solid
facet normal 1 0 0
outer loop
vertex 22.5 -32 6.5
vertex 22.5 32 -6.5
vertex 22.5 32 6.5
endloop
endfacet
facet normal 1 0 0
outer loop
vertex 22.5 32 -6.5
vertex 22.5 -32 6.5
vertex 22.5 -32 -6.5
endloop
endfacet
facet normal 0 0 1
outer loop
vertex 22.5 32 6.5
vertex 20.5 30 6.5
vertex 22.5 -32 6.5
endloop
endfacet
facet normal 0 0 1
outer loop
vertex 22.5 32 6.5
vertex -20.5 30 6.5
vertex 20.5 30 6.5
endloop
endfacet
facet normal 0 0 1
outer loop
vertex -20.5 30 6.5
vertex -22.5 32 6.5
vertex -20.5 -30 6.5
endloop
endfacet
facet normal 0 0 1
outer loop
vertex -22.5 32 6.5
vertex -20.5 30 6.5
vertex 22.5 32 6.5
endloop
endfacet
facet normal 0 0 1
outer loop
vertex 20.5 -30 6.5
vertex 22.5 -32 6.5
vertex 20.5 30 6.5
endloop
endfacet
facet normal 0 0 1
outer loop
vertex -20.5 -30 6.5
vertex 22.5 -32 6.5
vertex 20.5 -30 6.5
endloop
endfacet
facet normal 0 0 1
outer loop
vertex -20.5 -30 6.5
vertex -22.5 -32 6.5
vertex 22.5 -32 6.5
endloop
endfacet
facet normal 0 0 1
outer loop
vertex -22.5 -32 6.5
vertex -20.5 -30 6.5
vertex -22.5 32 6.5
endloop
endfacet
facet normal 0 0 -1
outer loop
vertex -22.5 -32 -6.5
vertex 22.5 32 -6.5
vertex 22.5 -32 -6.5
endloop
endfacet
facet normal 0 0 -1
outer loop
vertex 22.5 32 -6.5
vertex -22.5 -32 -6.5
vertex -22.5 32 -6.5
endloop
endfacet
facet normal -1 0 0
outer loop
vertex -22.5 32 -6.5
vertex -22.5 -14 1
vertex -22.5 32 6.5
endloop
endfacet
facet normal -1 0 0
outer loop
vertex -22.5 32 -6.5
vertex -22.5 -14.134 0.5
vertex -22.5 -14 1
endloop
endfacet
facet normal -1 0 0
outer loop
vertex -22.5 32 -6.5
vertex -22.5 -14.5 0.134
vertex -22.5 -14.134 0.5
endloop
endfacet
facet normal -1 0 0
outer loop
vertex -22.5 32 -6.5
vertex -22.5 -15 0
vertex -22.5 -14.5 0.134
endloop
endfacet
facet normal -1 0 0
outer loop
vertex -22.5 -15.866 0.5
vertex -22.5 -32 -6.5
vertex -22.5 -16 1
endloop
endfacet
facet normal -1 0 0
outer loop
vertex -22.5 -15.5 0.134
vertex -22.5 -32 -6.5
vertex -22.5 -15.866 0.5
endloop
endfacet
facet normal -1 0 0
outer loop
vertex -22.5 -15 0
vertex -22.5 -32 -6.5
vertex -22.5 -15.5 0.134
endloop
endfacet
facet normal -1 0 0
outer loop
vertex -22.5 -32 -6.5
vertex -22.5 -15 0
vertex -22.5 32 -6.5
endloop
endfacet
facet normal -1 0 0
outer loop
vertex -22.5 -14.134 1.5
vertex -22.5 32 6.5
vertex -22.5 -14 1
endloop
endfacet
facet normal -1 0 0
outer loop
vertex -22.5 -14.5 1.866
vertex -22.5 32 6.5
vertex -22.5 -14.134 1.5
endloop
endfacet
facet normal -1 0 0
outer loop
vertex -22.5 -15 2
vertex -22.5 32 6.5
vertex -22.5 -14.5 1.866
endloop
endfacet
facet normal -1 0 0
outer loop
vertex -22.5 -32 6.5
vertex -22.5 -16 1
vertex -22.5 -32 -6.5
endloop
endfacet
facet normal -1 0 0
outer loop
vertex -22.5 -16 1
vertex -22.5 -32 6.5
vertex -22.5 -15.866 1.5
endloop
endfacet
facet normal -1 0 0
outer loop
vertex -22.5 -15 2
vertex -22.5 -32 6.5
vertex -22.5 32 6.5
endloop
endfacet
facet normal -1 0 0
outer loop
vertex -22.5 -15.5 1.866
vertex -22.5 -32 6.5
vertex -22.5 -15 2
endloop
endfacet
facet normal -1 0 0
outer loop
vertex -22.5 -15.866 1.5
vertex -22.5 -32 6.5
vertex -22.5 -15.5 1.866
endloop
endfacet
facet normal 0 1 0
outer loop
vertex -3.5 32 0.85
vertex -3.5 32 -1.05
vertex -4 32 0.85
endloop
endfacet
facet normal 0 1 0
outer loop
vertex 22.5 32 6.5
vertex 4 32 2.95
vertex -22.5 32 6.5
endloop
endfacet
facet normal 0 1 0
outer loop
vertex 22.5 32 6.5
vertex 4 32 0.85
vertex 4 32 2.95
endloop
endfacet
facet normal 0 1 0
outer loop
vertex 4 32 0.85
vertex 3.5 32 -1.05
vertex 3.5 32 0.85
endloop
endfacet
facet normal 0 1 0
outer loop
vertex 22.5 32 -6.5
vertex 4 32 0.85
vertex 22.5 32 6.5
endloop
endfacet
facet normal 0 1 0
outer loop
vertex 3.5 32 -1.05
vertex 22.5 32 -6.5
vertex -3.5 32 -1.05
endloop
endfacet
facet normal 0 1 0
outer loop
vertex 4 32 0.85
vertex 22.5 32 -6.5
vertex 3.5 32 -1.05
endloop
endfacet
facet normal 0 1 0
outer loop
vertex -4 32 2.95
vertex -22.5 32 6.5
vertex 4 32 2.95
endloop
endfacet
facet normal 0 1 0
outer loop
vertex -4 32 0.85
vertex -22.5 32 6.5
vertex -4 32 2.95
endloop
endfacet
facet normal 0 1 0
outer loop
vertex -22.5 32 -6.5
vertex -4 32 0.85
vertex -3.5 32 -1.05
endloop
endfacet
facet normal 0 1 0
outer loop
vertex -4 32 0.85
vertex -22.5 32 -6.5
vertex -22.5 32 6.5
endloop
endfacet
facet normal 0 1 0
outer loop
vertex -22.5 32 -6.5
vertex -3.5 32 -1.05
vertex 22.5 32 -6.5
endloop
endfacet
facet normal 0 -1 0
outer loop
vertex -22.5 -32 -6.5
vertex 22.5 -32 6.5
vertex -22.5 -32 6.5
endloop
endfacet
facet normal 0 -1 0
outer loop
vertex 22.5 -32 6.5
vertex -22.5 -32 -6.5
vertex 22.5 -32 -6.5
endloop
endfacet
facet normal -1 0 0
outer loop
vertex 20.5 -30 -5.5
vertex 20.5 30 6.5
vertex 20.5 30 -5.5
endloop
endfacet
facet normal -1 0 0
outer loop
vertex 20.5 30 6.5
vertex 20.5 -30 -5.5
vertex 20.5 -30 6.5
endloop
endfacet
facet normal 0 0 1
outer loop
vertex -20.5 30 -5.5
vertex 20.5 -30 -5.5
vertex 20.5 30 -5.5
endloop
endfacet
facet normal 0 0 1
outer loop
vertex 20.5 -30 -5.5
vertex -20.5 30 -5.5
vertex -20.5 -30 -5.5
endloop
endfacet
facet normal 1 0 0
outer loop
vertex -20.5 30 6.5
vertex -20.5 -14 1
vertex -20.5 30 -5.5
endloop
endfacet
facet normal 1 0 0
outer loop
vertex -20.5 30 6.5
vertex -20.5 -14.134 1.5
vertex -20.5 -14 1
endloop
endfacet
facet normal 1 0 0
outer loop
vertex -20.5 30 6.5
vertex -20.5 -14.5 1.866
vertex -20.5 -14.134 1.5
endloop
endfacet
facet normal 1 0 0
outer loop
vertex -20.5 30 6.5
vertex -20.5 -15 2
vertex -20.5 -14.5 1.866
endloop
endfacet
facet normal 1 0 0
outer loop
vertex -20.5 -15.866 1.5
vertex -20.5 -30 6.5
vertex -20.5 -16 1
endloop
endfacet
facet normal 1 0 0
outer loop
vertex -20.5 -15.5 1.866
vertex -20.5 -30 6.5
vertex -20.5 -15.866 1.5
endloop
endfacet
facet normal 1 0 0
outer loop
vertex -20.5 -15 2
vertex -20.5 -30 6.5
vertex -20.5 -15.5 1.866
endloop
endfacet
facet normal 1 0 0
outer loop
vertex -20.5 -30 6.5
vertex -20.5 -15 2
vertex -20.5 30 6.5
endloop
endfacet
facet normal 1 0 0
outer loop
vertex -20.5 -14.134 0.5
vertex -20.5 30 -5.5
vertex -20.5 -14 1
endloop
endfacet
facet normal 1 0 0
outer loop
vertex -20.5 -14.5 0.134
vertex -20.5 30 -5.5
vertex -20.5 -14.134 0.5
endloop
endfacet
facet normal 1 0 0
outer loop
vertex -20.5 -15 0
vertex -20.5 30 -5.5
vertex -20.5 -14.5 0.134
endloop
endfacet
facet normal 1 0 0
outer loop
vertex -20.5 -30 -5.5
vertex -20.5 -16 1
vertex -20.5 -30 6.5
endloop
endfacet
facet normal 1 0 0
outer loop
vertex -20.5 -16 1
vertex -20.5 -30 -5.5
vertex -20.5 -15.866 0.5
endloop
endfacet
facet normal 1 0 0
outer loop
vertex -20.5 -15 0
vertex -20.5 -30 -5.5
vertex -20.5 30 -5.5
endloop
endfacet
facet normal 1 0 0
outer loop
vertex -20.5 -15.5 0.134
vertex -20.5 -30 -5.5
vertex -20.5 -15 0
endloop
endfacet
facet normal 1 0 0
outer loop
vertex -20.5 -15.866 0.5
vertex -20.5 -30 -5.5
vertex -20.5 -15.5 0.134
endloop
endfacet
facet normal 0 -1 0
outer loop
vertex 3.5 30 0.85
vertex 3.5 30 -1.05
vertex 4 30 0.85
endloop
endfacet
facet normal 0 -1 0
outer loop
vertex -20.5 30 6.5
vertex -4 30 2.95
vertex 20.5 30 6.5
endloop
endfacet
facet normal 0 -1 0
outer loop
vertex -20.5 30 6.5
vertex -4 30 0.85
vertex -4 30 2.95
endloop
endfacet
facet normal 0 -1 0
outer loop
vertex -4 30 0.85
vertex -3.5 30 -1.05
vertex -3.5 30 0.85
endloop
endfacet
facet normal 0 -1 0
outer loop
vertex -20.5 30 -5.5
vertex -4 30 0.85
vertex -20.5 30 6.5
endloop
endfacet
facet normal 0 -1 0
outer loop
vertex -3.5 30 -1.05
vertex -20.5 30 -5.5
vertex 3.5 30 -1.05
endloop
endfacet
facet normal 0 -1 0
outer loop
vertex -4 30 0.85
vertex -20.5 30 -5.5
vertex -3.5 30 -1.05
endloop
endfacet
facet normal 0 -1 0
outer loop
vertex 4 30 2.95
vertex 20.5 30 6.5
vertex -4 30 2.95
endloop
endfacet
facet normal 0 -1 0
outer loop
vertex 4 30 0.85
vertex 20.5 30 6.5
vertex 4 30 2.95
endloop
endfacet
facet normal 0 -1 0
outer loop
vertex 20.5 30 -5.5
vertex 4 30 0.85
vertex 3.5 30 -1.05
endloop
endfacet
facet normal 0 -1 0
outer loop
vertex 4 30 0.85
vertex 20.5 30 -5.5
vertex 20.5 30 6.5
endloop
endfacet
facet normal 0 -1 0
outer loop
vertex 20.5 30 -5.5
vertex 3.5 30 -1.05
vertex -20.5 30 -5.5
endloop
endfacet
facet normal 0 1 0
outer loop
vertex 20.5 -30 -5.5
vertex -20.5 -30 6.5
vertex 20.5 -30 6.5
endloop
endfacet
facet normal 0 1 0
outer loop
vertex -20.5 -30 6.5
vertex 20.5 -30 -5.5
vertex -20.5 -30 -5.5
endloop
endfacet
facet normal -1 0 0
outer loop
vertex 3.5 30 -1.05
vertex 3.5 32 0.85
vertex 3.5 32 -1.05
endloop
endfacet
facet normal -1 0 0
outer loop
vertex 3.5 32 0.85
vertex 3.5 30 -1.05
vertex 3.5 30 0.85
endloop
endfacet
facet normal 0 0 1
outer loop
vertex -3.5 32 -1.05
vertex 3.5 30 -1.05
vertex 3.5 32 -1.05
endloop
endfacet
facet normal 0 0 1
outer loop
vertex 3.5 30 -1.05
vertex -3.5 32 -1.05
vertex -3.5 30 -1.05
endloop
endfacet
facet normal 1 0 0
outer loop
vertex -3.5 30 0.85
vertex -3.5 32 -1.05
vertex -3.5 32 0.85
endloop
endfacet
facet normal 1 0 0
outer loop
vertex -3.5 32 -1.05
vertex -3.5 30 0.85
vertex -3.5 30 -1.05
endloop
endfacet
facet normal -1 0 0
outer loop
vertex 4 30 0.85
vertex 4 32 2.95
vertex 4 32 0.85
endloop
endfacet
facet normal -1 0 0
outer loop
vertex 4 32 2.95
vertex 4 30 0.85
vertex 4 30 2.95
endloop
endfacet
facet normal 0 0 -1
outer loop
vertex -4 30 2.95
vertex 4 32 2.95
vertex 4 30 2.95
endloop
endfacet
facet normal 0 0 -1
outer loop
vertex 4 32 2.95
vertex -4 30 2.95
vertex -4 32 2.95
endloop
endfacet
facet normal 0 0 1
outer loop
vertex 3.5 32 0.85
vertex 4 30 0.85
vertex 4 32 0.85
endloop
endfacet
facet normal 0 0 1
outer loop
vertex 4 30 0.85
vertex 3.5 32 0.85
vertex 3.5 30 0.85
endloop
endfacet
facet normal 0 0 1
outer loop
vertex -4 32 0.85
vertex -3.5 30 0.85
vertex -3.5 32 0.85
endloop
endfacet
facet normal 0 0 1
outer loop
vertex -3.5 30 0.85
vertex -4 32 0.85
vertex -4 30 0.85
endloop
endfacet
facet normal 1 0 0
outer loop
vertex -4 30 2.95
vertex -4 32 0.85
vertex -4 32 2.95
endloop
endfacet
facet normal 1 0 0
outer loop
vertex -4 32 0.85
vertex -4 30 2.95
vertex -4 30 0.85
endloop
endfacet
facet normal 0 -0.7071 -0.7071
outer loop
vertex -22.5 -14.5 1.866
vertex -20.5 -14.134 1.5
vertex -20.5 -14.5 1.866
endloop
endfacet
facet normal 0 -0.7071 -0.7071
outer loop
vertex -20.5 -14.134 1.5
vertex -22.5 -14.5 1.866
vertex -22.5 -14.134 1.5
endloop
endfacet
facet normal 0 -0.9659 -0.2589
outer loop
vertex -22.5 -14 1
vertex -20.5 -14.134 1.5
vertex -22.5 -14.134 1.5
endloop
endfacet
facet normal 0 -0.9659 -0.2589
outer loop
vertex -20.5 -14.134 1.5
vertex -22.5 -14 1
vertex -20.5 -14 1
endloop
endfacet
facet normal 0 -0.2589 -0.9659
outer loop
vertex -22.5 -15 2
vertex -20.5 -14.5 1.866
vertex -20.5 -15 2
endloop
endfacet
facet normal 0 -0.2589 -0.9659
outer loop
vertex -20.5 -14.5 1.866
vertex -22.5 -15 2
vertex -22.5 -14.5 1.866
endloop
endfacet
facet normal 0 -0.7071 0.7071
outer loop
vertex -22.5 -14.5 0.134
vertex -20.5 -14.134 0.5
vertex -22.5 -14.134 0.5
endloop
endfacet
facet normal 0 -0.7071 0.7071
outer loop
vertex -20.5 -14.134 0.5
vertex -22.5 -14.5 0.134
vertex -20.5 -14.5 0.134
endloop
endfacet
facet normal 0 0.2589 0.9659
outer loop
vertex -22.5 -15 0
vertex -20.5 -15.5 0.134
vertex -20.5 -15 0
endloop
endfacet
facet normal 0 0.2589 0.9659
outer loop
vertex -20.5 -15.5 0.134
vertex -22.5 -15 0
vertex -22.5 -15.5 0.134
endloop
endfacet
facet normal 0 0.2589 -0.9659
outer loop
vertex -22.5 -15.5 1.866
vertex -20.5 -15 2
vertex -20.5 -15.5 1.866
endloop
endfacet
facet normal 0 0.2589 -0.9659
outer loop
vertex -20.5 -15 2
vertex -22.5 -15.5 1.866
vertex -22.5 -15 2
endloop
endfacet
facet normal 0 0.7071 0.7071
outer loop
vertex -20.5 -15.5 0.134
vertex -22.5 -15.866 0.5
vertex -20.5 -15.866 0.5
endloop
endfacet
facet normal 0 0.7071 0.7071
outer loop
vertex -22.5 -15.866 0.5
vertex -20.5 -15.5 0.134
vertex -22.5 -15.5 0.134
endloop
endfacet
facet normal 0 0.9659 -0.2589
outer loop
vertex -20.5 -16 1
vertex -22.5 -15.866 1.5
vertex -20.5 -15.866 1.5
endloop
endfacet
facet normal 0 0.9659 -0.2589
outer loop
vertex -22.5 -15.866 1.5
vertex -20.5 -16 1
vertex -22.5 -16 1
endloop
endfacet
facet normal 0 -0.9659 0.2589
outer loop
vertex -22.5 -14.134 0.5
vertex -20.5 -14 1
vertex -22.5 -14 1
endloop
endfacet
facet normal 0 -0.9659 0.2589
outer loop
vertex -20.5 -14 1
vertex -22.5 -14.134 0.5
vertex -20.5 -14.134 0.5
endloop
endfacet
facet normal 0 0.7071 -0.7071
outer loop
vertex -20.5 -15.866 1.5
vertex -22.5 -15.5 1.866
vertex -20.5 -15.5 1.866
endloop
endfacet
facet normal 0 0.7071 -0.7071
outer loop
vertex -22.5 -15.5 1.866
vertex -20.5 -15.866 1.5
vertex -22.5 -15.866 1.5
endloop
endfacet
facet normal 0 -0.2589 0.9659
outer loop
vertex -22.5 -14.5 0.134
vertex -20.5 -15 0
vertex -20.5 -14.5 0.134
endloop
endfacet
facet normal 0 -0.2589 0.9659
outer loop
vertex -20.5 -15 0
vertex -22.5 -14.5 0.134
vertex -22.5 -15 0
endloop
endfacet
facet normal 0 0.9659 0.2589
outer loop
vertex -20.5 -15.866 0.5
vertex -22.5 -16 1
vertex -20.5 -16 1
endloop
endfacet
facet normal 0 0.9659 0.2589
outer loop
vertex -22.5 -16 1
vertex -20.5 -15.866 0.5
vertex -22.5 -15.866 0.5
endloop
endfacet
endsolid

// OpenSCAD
module micro_usb()
{
    cube([7,10,2.1],true);
    translate([0,0,1.9])
        cube([8,10,2.1],true);
}


module box()
{
    difference()
    {
        cube([45,64,13],true);
        translate([0,0,1])
            cube([41,60,13],true);
    }
}

difference()
{
box();
translate([0,30,0])
    micro_usb();
pinhole();
}

module pinhole()
{
    translate([-30,-15,1])
    rotate([90,0,90])
    cylinder(20,true,$fn=12);
}
